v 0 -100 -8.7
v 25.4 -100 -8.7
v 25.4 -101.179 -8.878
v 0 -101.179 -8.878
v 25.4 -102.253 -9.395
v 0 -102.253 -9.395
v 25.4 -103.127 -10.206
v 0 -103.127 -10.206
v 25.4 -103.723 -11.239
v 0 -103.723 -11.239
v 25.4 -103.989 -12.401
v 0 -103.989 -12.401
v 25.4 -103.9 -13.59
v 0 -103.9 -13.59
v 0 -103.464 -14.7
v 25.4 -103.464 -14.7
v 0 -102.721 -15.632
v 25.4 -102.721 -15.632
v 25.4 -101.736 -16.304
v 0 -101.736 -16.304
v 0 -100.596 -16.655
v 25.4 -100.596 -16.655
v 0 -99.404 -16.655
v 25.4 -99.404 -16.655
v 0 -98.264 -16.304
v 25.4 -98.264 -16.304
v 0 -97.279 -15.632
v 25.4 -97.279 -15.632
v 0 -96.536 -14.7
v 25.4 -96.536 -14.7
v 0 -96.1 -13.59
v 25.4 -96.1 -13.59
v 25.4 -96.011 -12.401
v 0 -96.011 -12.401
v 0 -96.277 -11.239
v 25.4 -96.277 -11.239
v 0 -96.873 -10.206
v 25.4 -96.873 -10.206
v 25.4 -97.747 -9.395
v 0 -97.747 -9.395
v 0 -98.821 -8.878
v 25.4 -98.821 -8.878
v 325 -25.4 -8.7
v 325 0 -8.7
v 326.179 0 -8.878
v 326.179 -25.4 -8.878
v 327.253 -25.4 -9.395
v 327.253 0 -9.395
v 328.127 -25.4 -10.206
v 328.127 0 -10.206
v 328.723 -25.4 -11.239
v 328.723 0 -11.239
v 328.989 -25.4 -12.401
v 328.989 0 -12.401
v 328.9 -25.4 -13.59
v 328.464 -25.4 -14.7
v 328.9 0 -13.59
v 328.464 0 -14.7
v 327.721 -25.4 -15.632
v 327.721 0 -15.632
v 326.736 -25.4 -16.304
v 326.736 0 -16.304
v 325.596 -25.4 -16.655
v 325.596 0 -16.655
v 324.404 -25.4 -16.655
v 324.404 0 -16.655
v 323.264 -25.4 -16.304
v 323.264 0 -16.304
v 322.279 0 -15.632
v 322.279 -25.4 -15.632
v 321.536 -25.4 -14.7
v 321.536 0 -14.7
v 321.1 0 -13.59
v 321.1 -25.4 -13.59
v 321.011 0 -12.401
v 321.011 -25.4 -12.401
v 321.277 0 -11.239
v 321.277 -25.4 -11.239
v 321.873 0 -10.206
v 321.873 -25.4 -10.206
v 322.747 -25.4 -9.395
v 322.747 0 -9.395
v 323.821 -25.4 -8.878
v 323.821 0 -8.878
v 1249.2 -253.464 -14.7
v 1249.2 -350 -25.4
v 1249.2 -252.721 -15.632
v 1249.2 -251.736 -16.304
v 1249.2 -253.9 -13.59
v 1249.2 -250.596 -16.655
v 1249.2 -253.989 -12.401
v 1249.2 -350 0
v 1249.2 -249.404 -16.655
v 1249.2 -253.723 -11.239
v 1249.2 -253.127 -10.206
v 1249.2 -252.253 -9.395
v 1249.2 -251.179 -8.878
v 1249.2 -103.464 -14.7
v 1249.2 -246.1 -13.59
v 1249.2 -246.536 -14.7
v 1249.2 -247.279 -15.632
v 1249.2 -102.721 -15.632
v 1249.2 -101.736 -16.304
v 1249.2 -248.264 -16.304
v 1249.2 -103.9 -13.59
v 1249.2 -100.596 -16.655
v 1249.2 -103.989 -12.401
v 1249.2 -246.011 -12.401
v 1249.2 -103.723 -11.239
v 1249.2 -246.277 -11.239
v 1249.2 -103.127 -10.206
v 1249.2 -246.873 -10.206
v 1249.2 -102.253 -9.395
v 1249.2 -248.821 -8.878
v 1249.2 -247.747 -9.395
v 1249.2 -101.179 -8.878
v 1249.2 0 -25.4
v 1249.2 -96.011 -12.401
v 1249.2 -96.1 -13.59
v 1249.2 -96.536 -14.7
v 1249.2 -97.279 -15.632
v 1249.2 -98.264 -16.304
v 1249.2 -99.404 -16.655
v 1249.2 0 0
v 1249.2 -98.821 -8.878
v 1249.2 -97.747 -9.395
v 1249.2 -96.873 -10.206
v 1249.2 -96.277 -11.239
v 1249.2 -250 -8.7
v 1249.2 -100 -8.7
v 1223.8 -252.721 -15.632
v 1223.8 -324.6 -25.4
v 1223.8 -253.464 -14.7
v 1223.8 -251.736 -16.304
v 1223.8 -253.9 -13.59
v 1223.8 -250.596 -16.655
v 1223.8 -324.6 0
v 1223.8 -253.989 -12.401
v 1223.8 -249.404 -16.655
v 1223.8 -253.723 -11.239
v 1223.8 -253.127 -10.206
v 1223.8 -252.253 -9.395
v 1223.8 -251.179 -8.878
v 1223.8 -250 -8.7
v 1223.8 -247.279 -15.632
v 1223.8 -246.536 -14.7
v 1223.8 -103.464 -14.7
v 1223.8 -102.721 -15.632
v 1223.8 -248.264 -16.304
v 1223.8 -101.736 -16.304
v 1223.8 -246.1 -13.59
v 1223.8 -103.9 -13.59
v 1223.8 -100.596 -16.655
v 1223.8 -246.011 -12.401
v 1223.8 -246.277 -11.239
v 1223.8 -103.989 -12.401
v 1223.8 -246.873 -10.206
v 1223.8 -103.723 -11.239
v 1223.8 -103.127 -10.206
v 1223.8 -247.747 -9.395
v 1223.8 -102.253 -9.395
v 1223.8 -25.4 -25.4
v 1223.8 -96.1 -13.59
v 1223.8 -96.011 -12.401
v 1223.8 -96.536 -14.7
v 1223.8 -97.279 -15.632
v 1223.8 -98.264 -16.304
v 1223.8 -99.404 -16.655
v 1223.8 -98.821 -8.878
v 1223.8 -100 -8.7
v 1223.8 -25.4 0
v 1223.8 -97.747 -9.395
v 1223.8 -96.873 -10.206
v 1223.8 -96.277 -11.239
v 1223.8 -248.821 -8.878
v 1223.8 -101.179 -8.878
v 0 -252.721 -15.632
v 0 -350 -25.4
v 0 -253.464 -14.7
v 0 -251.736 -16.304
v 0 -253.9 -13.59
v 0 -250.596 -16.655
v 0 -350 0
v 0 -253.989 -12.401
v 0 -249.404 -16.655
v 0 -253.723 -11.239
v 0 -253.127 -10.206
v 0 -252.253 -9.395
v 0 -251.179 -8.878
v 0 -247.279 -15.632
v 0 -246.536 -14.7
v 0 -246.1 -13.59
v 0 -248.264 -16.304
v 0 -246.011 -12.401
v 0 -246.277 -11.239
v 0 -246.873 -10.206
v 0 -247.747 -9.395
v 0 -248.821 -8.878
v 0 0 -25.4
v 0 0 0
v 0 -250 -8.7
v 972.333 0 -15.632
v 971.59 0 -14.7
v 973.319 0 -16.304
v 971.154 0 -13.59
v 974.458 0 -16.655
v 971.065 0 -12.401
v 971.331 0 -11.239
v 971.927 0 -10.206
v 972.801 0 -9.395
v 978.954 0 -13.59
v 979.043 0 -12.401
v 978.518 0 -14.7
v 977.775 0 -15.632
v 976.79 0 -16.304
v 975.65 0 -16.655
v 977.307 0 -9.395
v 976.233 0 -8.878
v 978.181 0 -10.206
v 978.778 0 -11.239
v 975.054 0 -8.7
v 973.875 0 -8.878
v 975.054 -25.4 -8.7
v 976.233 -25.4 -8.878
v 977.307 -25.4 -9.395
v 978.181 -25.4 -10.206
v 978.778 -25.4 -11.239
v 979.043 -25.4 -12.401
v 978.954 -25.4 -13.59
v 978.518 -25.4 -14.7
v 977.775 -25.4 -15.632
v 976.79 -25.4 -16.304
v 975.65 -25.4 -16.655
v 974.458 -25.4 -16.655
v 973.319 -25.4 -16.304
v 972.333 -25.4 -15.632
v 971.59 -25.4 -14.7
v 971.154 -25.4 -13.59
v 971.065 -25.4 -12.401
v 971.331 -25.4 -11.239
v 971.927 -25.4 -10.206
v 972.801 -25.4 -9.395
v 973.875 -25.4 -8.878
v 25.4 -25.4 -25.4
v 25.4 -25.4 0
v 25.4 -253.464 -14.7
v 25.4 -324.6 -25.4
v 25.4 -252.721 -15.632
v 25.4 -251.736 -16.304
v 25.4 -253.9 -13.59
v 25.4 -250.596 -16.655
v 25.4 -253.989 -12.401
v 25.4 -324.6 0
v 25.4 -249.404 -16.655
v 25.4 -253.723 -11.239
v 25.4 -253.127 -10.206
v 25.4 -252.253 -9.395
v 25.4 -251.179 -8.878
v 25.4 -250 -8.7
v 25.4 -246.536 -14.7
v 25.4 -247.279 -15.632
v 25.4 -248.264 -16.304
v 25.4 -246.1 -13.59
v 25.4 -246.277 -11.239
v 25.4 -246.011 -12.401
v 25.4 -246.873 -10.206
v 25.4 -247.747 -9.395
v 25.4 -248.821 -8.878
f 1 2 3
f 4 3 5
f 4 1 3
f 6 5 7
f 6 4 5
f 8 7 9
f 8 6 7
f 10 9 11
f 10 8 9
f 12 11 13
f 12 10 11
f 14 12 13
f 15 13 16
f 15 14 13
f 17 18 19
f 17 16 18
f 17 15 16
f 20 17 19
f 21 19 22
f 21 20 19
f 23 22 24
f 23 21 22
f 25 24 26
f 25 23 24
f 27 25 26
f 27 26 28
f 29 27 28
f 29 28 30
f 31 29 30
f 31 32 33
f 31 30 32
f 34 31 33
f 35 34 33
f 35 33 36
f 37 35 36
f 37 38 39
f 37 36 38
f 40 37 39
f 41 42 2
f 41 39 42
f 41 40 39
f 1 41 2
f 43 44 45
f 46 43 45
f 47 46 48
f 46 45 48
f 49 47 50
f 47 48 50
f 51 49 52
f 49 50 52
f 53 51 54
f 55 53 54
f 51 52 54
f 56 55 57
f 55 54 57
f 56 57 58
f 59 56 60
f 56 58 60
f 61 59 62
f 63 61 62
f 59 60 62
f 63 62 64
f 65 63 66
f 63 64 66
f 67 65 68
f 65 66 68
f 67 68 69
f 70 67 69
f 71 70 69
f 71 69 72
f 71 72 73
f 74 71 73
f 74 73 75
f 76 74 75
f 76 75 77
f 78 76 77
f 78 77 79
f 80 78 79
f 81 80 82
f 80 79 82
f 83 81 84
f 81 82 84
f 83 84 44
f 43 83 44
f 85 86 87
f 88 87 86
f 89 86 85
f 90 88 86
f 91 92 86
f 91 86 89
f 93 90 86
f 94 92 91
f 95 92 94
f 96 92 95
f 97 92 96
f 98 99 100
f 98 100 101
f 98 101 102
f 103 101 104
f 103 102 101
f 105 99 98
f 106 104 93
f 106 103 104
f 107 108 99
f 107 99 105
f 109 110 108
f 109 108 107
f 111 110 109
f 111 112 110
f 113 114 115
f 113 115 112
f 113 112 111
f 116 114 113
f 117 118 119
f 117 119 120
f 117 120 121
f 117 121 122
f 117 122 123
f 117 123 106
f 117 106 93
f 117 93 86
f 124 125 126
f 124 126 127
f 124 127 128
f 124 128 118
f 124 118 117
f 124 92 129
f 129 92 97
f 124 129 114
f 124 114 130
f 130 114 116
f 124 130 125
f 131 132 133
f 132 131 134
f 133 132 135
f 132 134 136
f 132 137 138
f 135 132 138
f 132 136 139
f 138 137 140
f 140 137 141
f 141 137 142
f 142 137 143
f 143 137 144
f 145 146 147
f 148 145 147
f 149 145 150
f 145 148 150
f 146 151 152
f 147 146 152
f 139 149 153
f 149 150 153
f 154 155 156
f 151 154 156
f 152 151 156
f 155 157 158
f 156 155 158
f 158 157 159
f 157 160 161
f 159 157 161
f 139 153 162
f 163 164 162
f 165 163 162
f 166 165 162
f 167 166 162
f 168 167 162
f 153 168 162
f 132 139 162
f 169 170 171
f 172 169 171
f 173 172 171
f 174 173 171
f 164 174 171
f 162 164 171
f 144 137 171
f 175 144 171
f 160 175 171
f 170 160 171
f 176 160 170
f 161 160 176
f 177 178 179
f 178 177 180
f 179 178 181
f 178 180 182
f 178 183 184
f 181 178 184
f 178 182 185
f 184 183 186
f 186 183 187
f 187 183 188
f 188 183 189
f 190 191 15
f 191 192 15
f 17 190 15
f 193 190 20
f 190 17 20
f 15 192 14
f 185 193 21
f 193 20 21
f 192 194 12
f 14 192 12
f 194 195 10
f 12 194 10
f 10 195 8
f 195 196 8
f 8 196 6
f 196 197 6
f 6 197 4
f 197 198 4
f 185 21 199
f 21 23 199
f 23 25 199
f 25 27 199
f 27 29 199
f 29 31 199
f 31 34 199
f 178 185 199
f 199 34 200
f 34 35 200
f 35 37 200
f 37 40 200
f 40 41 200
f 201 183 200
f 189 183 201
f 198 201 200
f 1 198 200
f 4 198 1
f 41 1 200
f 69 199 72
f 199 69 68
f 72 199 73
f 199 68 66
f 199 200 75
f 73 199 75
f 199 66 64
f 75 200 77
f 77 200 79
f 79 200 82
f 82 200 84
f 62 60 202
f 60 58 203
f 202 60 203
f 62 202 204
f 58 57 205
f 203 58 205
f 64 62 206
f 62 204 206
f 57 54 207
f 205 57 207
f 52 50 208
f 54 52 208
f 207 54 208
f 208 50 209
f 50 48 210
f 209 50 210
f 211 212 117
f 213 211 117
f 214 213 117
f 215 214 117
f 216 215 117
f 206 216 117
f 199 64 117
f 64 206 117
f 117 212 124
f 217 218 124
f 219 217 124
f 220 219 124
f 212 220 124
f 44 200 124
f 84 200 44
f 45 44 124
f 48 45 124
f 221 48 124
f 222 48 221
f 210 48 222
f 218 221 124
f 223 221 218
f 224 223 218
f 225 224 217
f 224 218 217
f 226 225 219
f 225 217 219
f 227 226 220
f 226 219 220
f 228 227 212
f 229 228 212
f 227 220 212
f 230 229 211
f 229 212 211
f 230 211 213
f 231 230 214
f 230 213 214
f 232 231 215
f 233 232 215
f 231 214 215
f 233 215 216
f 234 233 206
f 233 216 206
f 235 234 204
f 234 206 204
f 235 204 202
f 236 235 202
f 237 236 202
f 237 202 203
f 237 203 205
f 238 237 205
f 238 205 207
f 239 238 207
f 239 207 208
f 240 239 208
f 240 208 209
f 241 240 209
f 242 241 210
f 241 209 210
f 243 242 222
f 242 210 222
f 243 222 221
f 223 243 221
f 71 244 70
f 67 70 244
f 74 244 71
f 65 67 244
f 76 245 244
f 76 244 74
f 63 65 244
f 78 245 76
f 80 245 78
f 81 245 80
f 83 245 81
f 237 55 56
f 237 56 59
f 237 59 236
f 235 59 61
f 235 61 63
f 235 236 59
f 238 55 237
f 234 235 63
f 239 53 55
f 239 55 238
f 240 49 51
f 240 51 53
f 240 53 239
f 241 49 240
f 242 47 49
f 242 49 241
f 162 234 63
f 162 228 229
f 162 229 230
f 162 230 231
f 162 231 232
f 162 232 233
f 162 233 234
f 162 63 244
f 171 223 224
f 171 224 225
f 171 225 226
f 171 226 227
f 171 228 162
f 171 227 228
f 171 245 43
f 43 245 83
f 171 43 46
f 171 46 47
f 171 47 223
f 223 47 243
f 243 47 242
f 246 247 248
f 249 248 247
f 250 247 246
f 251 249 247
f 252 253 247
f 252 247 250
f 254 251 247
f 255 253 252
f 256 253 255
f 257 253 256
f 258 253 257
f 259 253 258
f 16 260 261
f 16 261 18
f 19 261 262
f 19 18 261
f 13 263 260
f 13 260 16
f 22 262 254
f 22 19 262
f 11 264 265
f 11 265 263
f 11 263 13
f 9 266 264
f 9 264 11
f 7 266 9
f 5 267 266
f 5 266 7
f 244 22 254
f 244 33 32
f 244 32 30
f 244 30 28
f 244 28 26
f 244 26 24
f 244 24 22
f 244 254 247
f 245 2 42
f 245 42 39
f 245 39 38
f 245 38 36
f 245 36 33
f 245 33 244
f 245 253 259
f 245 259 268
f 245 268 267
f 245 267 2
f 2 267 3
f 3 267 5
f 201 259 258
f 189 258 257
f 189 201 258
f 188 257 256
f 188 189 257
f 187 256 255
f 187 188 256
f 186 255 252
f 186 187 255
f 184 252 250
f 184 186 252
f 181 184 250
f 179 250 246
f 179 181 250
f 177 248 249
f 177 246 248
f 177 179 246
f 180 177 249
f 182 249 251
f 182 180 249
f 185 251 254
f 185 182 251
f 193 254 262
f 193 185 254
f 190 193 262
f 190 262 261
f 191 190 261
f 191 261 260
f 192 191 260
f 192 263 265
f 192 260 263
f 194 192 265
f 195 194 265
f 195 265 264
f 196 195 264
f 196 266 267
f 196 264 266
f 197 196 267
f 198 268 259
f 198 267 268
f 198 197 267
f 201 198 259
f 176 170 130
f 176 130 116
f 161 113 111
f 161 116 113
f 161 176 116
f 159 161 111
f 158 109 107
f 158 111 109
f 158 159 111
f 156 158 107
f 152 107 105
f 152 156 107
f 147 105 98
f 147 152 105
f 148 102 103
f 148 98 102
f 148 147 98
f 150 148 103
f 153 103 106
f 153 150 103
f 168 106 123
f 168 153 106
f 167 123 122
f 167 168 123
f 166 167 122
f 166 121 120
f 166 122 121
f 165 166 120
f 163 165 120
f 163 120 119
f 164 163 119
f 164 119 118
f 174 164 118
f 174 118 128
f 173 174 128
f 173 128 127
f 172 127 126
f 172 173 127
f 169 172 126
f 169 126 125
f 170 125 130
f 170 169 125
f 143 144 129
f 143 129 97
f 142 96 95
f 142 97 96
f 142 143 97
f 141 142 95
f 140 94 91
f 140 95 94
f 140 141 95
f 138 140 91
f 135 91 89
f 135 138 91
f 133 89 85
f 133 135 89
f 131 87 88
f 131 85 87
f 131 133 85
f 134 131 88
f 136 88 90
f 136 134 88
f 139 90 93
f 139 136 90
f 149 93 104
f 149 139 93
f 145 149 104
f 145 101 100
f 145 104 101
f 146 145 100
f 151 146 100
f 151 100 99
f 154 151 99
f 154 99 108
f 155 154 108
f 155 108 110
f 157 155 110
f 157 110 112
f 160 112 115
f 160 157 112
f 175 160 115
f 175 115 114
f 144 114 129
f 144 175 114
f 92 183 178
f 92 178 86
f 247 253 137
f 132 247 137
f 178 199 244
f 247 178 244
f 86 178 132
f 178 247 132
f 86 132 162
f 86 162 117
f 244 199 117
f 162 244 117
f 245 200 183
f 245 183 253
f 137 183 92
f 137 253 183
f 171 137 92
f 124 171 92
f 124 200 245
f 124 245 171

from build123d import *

# Parameters (mm, degrees)
SKETCH1_W           = 1249.2
SKETCH1_H           = 350
SKETCH1_W_2         = 1198.4
SKETCH1_H_2         = 299.2
BOSS_EXTRUDE1_DEPTH = 25.4
SKETCH2_R           = 4
CUT_EXTRUDE3_DEPTH  = 25.4
SKETCH3_R           = 4
CUT_EXTRUDE10_DEPTH = 5341.4


with BuildPart() as part:
    # Sketch1 → Boss-Extrude1 (new body)
    with BuildSketch(Plane.XY):
        with Locations((624.6, -175)):
            Rectangle(SKETCH1_W, SKETCH1_H)
        with Locations((624.6, -175)):
            Rectangle(SKETCH1_W_2, SKETCH1_H_2, mode=Mode.SUBTRACT)
    extrude(amount=-BOSS_EXTRUDE1_DEPTH)

    # Sketch2 → Cut-Extrude3 (cut)
    with BuildSketch(Plane(origin=(0, 0, 0), x_dir=(1, 0, 0), z_dir=(0, 1, 0))):
        with Locations(Location((325, 12.7, 0), (0, 0, 270))):
            Circle(SKETCH2_R)
        with Locations(Location((975.054095101, 12.7, 0), (0, 0, 270))):
            Circle(SKETCH2_R)
    extrude(amount=-CUT_EXTRUDE3_DEPTH, mode=Mode.SUBTRACT)

    # Sketch3 → Cut-Extrude10 (cut)
    with BuildSketch(Plane(origin=(0, 0, 0), x_dir=(0, 0, -1), z_dir=(1, 0, 0))):
        with Locations(Location((12.7, -100, 0), (0, 0, 180))):
            Circle(SKETCH3_R)
        with Locations(Location((12.7, -250, 0), (0, 0, 180))):
            Circle(SKETCH3_R)
    extrude(amount=CUT_EXTRUDE10_DEPTH, mode=Mode.SUBTRACT)


solid = part.part
